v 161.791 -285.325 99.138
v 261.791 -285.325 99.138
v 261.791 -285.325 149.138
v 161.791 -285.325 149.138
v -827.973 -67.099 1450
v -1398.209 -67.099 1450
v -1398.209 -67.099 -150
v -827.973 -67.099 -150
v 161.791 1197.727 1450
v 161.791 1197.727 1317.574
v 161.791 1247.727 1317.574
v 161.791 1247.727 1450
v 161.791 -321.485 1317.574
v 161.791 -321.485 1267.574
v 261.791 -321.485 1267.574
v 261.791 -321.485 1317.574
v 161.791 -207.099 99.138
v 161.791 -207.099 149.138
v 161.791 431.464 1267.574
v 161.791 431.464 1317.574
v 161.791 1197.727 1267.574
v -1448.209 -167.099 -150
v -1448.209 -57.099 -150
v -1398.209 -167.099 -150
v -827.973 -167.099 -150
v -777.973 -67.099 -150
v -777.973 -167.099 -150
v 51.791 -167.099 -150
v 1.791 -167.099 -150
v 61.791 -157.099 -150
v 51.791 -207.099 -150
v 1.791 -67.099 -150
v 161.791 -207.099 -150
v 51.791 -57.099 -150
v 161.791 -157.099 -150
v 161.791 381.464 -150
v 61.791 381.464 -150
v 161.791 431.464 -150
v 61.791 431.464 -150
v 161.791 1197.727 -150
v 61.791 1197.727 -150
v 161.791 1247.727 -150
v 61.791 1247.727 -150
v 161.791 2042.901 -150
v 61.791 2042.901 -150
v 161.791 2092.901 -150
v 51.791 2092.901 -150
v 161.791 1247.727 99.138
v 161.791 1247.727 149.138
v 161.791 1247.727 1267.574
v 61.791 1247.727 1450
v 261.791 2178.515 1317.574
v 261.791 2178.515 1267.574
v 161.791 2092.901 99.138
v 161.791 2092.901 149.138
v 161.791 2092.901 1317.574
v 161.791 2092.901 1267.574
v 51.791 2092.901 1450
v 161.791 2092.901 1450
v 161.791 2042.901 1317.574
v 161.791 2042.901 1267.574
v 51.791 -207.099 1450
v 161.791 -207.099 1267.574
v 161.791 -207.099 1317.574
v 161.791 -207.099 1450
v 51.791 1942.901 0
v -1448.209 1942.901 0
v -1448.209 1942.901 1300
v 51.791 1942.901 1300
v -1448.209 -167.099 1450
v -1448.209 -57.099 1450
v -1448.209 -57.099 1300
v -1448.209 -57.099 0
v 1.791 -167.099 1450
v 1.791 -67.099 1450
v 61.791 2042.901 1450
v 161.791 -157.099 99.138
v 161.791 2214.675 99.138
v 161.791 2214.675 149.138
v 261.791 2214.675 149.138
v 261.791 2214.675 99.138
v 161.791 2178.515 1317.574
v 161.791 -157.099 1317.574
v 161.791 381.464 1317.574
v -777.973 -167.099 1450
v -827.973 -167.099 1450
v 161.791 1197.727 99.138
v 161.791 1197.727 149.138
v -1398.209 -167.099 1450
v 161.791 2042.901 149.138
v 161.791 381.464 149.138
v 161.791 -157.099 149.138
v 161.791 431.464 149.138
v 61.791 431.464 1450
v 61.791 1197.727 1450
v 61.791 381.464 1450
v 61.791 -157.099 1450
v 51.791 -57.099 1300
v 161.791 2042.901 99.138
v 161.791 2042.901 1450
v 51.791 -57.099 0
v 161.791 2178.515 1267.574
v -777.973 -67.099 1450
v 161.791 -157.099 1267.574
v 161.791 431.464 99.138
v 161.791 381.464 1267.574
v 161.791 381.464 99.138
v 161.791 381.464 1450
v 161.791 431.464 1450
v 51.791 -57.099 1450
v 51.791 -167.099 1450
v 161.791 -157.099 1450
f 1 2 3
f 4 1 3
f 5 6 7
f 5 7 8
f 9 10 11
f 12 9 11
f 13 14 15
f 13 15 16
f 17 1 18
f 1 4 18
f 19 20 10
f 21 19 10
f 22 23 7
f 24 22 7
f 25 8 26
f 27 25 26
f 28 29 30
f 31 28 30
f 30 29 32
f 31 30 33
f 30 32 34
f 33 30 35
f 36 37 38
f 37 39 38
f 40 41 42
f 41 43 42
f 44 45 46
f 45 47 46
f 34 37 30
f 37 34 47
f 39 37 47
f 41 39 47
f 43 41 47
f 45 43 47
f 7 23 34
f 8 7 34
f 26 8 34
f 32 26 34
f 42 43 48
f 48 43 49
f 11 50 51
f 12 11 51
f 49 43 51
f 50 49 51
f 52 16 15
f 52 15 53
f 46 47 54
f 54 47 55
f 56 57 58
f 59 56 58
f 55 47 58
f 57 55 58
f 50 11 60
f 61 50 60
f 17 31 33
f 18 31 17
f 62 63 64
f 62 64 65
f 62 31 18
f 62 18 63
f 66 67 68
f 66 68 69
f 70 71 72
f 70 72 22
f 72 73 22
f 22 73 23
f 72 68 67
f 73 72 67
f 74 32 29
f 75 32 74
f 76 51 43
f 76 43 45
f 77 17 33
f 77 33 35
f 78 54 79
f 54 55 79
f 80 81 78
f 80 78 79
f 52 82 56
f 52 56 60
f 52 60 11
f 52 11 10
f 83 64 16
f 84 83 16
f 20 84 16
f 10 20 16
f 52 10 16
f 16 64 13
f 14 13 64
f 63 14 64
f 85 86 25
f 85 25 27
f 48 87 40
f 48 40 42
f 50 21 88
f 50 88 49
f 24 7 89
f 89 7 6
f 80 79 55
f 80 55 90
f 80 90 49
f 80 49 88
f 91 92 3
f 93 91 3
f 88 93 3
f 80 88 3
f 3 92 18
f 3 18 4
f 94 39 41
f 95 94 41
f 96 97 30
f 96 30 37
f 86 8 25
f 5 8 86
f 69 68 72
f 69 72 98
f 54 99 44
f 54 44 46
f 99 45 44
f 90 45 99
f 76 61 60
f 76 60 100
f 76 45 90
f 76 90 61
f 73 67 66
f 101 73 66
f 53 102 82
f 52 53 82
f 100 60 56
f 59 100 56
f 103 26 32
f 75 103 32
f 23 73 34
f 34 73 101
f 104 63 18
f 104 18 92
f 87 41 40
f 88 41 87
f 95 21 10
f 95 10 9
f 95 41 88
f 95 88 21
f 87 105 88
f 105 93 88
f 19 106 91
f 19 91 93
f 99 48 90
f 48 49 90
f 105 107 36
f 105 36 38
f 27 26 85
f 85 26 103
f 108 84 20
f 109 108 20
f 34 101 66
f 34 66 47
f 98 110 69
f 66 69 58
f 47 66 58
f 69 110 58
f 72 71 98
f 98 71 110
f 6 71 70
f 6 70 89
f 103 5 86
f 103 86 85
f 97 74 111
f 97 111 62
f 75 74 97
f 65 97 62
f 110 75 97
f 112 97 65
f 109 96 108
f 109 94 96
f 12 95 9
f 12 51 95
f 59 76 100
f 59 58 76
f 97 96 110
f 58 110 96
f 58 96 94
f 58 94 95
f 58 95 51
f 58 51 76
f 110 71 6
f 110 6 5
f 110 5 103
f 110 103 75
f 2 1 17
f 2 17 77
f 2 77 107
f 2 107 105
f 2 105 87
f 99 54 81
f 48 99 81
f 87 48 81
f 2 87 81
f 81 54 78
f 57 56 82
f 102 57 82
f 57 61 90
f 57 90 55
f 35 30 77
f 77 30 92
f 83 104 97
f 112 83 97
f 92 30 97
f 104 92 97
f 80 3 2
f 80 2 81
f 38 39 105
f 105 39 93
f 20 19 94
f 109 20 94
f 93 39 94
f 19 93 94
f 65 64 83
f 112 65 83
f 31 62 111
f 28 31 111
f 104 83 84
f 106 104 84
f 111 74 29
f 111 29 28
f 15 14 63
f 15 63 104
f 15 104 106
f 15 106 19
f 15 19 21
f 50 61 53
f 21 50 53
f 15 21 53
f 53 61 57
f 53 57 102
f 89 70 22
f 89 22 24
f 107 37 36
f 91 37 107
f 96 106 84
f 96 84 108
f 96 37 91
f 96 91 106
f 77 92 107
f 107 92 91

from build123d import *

# Parameters (mm, degrees)
F0_W      = 1500
F0_H      = 2000
F1_DEPTH  = 1300
F2_W      = 2300
F2_H      = 1600
F2_W_2    = 2000
F2_H_2    = 1300
F3_DEPTH  = 10
F4_W      = 50
F4_H      = 1600
F5_DEPTH  = 100
F6_W      = 114.3861696124
F6_H      = 50
F6_W_2    = 50
F6_W_3    = 2335.6138303876
F6_W_4    = 2371.7742994428
F6_W_5    = 78.2257005572
F7_DEPTH  = 100
F8_W      = 1500
F8_H      = 150
F8_H_2    = 1300
F9_DEPTH  = 10
F10_W     = 50
F10_H     = 1600
F11_DEPTH = 100


with BuildPart() as f1:
    # F0 (on Top) → F1 (new body)
    with BuildSketch(Plane.XY):
        with Locations((-698.2090473175, 942.9008886218)):
            Rectangle(F0_W, F0_H)
    extrude(amount=F1_DEPTH)

    # F2 (on face) → F3 (join)
    with BuildSketch(Plane.YZ.offset(51.7909526825)):
        with Locations((942.9008886218, 650)):
            Rectangle(F2_W, F2_H)
        with Locations((942.9008886218, 650)):
            Rectangle(F2_W_2, F2_H_2, mode=Mode.SUBTRACT)
        with Locations((942.9008886218, 650)):
            Rectangle(F2_W_2, F2_H_2)
    extrude(amount=F3_DEPTH)

    # F4 (on face) → F5 (join)
    with BuildSketch(Plane.YZ.offset(61.7909526825)):
        with Locations((-182.0991113782, 650)):
            Rectangle(F4_W, F4_H)
        with Locations((406.4638853073, 650)):
            Rectangle(F4_W, F4_H)
        with Locations((1222.7266073227, 650)):
            Rectangle(F4_W, F4_H)
        with Locations((2067.9008886218, 650)):
            Rectangle(F4_W, F4_H)
    extrude(amount=F5_DEPTH)

    # F6 (on face) → F7 (join)
    with BuildSketch(Plane.YZ.offset(161.7909526825)):
        with Locations((-264.2921961844, 1292.5743103027)):
            Rectangle(F6_W, F6_H)
        with Locations((-182.0991113782, 1292.5743103027)):
            Rectangle(F6_W_2, F6_H)
        with Locations((1010.7078038156, 1292.5743103027)):
            Rectangle(F6_W_3, F6_H)
        with Locations((1028.7880383432, 124.1379097104)):
            Rectangle(F6_W_4, F6_H)
        with Locations((-182.0991113782, 124.1379097104)):
            Rectangle(F6_W_2, F6_H)
        with Locations((-246.2119616568, 124.1379097104)):
            Rectangle(F6_W_5, F6_H)
    extrude(amount=F7_DEPTH)

    # F8 (on face) → F9 (join)
    with BuildSketch(Plane.XZ.offset(57.0991113782)):
        with Locations((-698.2090473175, 1375)):
            Rectangle(F8_W, F8_H)
        with Locations((-698.2090473175, 650)):
            Rectangle(F8_W, F8_H_2)
        with Locations((-698.2090473175, -75)):
            Rectangle(F8_W, F8_H)
    extrude(amount=F9_DEPTH)

    # F10 (on face) → F11 (join)
    with BuildSketch(Plane.XZ.offset(67.0991113782)):
        with Locations((26.7909526825, 650)):
            Rectangle(F10_W, F10_H)
        with Locations((-802.9731273651, 650)):
            Rectangle(F10_W, F10_H)
        with Locations((-1423.2090473175, 650)):
            Rectangle(F10_W, F10_H)
    extrude(amount=F11_DEPTH)


solid = f1.part
